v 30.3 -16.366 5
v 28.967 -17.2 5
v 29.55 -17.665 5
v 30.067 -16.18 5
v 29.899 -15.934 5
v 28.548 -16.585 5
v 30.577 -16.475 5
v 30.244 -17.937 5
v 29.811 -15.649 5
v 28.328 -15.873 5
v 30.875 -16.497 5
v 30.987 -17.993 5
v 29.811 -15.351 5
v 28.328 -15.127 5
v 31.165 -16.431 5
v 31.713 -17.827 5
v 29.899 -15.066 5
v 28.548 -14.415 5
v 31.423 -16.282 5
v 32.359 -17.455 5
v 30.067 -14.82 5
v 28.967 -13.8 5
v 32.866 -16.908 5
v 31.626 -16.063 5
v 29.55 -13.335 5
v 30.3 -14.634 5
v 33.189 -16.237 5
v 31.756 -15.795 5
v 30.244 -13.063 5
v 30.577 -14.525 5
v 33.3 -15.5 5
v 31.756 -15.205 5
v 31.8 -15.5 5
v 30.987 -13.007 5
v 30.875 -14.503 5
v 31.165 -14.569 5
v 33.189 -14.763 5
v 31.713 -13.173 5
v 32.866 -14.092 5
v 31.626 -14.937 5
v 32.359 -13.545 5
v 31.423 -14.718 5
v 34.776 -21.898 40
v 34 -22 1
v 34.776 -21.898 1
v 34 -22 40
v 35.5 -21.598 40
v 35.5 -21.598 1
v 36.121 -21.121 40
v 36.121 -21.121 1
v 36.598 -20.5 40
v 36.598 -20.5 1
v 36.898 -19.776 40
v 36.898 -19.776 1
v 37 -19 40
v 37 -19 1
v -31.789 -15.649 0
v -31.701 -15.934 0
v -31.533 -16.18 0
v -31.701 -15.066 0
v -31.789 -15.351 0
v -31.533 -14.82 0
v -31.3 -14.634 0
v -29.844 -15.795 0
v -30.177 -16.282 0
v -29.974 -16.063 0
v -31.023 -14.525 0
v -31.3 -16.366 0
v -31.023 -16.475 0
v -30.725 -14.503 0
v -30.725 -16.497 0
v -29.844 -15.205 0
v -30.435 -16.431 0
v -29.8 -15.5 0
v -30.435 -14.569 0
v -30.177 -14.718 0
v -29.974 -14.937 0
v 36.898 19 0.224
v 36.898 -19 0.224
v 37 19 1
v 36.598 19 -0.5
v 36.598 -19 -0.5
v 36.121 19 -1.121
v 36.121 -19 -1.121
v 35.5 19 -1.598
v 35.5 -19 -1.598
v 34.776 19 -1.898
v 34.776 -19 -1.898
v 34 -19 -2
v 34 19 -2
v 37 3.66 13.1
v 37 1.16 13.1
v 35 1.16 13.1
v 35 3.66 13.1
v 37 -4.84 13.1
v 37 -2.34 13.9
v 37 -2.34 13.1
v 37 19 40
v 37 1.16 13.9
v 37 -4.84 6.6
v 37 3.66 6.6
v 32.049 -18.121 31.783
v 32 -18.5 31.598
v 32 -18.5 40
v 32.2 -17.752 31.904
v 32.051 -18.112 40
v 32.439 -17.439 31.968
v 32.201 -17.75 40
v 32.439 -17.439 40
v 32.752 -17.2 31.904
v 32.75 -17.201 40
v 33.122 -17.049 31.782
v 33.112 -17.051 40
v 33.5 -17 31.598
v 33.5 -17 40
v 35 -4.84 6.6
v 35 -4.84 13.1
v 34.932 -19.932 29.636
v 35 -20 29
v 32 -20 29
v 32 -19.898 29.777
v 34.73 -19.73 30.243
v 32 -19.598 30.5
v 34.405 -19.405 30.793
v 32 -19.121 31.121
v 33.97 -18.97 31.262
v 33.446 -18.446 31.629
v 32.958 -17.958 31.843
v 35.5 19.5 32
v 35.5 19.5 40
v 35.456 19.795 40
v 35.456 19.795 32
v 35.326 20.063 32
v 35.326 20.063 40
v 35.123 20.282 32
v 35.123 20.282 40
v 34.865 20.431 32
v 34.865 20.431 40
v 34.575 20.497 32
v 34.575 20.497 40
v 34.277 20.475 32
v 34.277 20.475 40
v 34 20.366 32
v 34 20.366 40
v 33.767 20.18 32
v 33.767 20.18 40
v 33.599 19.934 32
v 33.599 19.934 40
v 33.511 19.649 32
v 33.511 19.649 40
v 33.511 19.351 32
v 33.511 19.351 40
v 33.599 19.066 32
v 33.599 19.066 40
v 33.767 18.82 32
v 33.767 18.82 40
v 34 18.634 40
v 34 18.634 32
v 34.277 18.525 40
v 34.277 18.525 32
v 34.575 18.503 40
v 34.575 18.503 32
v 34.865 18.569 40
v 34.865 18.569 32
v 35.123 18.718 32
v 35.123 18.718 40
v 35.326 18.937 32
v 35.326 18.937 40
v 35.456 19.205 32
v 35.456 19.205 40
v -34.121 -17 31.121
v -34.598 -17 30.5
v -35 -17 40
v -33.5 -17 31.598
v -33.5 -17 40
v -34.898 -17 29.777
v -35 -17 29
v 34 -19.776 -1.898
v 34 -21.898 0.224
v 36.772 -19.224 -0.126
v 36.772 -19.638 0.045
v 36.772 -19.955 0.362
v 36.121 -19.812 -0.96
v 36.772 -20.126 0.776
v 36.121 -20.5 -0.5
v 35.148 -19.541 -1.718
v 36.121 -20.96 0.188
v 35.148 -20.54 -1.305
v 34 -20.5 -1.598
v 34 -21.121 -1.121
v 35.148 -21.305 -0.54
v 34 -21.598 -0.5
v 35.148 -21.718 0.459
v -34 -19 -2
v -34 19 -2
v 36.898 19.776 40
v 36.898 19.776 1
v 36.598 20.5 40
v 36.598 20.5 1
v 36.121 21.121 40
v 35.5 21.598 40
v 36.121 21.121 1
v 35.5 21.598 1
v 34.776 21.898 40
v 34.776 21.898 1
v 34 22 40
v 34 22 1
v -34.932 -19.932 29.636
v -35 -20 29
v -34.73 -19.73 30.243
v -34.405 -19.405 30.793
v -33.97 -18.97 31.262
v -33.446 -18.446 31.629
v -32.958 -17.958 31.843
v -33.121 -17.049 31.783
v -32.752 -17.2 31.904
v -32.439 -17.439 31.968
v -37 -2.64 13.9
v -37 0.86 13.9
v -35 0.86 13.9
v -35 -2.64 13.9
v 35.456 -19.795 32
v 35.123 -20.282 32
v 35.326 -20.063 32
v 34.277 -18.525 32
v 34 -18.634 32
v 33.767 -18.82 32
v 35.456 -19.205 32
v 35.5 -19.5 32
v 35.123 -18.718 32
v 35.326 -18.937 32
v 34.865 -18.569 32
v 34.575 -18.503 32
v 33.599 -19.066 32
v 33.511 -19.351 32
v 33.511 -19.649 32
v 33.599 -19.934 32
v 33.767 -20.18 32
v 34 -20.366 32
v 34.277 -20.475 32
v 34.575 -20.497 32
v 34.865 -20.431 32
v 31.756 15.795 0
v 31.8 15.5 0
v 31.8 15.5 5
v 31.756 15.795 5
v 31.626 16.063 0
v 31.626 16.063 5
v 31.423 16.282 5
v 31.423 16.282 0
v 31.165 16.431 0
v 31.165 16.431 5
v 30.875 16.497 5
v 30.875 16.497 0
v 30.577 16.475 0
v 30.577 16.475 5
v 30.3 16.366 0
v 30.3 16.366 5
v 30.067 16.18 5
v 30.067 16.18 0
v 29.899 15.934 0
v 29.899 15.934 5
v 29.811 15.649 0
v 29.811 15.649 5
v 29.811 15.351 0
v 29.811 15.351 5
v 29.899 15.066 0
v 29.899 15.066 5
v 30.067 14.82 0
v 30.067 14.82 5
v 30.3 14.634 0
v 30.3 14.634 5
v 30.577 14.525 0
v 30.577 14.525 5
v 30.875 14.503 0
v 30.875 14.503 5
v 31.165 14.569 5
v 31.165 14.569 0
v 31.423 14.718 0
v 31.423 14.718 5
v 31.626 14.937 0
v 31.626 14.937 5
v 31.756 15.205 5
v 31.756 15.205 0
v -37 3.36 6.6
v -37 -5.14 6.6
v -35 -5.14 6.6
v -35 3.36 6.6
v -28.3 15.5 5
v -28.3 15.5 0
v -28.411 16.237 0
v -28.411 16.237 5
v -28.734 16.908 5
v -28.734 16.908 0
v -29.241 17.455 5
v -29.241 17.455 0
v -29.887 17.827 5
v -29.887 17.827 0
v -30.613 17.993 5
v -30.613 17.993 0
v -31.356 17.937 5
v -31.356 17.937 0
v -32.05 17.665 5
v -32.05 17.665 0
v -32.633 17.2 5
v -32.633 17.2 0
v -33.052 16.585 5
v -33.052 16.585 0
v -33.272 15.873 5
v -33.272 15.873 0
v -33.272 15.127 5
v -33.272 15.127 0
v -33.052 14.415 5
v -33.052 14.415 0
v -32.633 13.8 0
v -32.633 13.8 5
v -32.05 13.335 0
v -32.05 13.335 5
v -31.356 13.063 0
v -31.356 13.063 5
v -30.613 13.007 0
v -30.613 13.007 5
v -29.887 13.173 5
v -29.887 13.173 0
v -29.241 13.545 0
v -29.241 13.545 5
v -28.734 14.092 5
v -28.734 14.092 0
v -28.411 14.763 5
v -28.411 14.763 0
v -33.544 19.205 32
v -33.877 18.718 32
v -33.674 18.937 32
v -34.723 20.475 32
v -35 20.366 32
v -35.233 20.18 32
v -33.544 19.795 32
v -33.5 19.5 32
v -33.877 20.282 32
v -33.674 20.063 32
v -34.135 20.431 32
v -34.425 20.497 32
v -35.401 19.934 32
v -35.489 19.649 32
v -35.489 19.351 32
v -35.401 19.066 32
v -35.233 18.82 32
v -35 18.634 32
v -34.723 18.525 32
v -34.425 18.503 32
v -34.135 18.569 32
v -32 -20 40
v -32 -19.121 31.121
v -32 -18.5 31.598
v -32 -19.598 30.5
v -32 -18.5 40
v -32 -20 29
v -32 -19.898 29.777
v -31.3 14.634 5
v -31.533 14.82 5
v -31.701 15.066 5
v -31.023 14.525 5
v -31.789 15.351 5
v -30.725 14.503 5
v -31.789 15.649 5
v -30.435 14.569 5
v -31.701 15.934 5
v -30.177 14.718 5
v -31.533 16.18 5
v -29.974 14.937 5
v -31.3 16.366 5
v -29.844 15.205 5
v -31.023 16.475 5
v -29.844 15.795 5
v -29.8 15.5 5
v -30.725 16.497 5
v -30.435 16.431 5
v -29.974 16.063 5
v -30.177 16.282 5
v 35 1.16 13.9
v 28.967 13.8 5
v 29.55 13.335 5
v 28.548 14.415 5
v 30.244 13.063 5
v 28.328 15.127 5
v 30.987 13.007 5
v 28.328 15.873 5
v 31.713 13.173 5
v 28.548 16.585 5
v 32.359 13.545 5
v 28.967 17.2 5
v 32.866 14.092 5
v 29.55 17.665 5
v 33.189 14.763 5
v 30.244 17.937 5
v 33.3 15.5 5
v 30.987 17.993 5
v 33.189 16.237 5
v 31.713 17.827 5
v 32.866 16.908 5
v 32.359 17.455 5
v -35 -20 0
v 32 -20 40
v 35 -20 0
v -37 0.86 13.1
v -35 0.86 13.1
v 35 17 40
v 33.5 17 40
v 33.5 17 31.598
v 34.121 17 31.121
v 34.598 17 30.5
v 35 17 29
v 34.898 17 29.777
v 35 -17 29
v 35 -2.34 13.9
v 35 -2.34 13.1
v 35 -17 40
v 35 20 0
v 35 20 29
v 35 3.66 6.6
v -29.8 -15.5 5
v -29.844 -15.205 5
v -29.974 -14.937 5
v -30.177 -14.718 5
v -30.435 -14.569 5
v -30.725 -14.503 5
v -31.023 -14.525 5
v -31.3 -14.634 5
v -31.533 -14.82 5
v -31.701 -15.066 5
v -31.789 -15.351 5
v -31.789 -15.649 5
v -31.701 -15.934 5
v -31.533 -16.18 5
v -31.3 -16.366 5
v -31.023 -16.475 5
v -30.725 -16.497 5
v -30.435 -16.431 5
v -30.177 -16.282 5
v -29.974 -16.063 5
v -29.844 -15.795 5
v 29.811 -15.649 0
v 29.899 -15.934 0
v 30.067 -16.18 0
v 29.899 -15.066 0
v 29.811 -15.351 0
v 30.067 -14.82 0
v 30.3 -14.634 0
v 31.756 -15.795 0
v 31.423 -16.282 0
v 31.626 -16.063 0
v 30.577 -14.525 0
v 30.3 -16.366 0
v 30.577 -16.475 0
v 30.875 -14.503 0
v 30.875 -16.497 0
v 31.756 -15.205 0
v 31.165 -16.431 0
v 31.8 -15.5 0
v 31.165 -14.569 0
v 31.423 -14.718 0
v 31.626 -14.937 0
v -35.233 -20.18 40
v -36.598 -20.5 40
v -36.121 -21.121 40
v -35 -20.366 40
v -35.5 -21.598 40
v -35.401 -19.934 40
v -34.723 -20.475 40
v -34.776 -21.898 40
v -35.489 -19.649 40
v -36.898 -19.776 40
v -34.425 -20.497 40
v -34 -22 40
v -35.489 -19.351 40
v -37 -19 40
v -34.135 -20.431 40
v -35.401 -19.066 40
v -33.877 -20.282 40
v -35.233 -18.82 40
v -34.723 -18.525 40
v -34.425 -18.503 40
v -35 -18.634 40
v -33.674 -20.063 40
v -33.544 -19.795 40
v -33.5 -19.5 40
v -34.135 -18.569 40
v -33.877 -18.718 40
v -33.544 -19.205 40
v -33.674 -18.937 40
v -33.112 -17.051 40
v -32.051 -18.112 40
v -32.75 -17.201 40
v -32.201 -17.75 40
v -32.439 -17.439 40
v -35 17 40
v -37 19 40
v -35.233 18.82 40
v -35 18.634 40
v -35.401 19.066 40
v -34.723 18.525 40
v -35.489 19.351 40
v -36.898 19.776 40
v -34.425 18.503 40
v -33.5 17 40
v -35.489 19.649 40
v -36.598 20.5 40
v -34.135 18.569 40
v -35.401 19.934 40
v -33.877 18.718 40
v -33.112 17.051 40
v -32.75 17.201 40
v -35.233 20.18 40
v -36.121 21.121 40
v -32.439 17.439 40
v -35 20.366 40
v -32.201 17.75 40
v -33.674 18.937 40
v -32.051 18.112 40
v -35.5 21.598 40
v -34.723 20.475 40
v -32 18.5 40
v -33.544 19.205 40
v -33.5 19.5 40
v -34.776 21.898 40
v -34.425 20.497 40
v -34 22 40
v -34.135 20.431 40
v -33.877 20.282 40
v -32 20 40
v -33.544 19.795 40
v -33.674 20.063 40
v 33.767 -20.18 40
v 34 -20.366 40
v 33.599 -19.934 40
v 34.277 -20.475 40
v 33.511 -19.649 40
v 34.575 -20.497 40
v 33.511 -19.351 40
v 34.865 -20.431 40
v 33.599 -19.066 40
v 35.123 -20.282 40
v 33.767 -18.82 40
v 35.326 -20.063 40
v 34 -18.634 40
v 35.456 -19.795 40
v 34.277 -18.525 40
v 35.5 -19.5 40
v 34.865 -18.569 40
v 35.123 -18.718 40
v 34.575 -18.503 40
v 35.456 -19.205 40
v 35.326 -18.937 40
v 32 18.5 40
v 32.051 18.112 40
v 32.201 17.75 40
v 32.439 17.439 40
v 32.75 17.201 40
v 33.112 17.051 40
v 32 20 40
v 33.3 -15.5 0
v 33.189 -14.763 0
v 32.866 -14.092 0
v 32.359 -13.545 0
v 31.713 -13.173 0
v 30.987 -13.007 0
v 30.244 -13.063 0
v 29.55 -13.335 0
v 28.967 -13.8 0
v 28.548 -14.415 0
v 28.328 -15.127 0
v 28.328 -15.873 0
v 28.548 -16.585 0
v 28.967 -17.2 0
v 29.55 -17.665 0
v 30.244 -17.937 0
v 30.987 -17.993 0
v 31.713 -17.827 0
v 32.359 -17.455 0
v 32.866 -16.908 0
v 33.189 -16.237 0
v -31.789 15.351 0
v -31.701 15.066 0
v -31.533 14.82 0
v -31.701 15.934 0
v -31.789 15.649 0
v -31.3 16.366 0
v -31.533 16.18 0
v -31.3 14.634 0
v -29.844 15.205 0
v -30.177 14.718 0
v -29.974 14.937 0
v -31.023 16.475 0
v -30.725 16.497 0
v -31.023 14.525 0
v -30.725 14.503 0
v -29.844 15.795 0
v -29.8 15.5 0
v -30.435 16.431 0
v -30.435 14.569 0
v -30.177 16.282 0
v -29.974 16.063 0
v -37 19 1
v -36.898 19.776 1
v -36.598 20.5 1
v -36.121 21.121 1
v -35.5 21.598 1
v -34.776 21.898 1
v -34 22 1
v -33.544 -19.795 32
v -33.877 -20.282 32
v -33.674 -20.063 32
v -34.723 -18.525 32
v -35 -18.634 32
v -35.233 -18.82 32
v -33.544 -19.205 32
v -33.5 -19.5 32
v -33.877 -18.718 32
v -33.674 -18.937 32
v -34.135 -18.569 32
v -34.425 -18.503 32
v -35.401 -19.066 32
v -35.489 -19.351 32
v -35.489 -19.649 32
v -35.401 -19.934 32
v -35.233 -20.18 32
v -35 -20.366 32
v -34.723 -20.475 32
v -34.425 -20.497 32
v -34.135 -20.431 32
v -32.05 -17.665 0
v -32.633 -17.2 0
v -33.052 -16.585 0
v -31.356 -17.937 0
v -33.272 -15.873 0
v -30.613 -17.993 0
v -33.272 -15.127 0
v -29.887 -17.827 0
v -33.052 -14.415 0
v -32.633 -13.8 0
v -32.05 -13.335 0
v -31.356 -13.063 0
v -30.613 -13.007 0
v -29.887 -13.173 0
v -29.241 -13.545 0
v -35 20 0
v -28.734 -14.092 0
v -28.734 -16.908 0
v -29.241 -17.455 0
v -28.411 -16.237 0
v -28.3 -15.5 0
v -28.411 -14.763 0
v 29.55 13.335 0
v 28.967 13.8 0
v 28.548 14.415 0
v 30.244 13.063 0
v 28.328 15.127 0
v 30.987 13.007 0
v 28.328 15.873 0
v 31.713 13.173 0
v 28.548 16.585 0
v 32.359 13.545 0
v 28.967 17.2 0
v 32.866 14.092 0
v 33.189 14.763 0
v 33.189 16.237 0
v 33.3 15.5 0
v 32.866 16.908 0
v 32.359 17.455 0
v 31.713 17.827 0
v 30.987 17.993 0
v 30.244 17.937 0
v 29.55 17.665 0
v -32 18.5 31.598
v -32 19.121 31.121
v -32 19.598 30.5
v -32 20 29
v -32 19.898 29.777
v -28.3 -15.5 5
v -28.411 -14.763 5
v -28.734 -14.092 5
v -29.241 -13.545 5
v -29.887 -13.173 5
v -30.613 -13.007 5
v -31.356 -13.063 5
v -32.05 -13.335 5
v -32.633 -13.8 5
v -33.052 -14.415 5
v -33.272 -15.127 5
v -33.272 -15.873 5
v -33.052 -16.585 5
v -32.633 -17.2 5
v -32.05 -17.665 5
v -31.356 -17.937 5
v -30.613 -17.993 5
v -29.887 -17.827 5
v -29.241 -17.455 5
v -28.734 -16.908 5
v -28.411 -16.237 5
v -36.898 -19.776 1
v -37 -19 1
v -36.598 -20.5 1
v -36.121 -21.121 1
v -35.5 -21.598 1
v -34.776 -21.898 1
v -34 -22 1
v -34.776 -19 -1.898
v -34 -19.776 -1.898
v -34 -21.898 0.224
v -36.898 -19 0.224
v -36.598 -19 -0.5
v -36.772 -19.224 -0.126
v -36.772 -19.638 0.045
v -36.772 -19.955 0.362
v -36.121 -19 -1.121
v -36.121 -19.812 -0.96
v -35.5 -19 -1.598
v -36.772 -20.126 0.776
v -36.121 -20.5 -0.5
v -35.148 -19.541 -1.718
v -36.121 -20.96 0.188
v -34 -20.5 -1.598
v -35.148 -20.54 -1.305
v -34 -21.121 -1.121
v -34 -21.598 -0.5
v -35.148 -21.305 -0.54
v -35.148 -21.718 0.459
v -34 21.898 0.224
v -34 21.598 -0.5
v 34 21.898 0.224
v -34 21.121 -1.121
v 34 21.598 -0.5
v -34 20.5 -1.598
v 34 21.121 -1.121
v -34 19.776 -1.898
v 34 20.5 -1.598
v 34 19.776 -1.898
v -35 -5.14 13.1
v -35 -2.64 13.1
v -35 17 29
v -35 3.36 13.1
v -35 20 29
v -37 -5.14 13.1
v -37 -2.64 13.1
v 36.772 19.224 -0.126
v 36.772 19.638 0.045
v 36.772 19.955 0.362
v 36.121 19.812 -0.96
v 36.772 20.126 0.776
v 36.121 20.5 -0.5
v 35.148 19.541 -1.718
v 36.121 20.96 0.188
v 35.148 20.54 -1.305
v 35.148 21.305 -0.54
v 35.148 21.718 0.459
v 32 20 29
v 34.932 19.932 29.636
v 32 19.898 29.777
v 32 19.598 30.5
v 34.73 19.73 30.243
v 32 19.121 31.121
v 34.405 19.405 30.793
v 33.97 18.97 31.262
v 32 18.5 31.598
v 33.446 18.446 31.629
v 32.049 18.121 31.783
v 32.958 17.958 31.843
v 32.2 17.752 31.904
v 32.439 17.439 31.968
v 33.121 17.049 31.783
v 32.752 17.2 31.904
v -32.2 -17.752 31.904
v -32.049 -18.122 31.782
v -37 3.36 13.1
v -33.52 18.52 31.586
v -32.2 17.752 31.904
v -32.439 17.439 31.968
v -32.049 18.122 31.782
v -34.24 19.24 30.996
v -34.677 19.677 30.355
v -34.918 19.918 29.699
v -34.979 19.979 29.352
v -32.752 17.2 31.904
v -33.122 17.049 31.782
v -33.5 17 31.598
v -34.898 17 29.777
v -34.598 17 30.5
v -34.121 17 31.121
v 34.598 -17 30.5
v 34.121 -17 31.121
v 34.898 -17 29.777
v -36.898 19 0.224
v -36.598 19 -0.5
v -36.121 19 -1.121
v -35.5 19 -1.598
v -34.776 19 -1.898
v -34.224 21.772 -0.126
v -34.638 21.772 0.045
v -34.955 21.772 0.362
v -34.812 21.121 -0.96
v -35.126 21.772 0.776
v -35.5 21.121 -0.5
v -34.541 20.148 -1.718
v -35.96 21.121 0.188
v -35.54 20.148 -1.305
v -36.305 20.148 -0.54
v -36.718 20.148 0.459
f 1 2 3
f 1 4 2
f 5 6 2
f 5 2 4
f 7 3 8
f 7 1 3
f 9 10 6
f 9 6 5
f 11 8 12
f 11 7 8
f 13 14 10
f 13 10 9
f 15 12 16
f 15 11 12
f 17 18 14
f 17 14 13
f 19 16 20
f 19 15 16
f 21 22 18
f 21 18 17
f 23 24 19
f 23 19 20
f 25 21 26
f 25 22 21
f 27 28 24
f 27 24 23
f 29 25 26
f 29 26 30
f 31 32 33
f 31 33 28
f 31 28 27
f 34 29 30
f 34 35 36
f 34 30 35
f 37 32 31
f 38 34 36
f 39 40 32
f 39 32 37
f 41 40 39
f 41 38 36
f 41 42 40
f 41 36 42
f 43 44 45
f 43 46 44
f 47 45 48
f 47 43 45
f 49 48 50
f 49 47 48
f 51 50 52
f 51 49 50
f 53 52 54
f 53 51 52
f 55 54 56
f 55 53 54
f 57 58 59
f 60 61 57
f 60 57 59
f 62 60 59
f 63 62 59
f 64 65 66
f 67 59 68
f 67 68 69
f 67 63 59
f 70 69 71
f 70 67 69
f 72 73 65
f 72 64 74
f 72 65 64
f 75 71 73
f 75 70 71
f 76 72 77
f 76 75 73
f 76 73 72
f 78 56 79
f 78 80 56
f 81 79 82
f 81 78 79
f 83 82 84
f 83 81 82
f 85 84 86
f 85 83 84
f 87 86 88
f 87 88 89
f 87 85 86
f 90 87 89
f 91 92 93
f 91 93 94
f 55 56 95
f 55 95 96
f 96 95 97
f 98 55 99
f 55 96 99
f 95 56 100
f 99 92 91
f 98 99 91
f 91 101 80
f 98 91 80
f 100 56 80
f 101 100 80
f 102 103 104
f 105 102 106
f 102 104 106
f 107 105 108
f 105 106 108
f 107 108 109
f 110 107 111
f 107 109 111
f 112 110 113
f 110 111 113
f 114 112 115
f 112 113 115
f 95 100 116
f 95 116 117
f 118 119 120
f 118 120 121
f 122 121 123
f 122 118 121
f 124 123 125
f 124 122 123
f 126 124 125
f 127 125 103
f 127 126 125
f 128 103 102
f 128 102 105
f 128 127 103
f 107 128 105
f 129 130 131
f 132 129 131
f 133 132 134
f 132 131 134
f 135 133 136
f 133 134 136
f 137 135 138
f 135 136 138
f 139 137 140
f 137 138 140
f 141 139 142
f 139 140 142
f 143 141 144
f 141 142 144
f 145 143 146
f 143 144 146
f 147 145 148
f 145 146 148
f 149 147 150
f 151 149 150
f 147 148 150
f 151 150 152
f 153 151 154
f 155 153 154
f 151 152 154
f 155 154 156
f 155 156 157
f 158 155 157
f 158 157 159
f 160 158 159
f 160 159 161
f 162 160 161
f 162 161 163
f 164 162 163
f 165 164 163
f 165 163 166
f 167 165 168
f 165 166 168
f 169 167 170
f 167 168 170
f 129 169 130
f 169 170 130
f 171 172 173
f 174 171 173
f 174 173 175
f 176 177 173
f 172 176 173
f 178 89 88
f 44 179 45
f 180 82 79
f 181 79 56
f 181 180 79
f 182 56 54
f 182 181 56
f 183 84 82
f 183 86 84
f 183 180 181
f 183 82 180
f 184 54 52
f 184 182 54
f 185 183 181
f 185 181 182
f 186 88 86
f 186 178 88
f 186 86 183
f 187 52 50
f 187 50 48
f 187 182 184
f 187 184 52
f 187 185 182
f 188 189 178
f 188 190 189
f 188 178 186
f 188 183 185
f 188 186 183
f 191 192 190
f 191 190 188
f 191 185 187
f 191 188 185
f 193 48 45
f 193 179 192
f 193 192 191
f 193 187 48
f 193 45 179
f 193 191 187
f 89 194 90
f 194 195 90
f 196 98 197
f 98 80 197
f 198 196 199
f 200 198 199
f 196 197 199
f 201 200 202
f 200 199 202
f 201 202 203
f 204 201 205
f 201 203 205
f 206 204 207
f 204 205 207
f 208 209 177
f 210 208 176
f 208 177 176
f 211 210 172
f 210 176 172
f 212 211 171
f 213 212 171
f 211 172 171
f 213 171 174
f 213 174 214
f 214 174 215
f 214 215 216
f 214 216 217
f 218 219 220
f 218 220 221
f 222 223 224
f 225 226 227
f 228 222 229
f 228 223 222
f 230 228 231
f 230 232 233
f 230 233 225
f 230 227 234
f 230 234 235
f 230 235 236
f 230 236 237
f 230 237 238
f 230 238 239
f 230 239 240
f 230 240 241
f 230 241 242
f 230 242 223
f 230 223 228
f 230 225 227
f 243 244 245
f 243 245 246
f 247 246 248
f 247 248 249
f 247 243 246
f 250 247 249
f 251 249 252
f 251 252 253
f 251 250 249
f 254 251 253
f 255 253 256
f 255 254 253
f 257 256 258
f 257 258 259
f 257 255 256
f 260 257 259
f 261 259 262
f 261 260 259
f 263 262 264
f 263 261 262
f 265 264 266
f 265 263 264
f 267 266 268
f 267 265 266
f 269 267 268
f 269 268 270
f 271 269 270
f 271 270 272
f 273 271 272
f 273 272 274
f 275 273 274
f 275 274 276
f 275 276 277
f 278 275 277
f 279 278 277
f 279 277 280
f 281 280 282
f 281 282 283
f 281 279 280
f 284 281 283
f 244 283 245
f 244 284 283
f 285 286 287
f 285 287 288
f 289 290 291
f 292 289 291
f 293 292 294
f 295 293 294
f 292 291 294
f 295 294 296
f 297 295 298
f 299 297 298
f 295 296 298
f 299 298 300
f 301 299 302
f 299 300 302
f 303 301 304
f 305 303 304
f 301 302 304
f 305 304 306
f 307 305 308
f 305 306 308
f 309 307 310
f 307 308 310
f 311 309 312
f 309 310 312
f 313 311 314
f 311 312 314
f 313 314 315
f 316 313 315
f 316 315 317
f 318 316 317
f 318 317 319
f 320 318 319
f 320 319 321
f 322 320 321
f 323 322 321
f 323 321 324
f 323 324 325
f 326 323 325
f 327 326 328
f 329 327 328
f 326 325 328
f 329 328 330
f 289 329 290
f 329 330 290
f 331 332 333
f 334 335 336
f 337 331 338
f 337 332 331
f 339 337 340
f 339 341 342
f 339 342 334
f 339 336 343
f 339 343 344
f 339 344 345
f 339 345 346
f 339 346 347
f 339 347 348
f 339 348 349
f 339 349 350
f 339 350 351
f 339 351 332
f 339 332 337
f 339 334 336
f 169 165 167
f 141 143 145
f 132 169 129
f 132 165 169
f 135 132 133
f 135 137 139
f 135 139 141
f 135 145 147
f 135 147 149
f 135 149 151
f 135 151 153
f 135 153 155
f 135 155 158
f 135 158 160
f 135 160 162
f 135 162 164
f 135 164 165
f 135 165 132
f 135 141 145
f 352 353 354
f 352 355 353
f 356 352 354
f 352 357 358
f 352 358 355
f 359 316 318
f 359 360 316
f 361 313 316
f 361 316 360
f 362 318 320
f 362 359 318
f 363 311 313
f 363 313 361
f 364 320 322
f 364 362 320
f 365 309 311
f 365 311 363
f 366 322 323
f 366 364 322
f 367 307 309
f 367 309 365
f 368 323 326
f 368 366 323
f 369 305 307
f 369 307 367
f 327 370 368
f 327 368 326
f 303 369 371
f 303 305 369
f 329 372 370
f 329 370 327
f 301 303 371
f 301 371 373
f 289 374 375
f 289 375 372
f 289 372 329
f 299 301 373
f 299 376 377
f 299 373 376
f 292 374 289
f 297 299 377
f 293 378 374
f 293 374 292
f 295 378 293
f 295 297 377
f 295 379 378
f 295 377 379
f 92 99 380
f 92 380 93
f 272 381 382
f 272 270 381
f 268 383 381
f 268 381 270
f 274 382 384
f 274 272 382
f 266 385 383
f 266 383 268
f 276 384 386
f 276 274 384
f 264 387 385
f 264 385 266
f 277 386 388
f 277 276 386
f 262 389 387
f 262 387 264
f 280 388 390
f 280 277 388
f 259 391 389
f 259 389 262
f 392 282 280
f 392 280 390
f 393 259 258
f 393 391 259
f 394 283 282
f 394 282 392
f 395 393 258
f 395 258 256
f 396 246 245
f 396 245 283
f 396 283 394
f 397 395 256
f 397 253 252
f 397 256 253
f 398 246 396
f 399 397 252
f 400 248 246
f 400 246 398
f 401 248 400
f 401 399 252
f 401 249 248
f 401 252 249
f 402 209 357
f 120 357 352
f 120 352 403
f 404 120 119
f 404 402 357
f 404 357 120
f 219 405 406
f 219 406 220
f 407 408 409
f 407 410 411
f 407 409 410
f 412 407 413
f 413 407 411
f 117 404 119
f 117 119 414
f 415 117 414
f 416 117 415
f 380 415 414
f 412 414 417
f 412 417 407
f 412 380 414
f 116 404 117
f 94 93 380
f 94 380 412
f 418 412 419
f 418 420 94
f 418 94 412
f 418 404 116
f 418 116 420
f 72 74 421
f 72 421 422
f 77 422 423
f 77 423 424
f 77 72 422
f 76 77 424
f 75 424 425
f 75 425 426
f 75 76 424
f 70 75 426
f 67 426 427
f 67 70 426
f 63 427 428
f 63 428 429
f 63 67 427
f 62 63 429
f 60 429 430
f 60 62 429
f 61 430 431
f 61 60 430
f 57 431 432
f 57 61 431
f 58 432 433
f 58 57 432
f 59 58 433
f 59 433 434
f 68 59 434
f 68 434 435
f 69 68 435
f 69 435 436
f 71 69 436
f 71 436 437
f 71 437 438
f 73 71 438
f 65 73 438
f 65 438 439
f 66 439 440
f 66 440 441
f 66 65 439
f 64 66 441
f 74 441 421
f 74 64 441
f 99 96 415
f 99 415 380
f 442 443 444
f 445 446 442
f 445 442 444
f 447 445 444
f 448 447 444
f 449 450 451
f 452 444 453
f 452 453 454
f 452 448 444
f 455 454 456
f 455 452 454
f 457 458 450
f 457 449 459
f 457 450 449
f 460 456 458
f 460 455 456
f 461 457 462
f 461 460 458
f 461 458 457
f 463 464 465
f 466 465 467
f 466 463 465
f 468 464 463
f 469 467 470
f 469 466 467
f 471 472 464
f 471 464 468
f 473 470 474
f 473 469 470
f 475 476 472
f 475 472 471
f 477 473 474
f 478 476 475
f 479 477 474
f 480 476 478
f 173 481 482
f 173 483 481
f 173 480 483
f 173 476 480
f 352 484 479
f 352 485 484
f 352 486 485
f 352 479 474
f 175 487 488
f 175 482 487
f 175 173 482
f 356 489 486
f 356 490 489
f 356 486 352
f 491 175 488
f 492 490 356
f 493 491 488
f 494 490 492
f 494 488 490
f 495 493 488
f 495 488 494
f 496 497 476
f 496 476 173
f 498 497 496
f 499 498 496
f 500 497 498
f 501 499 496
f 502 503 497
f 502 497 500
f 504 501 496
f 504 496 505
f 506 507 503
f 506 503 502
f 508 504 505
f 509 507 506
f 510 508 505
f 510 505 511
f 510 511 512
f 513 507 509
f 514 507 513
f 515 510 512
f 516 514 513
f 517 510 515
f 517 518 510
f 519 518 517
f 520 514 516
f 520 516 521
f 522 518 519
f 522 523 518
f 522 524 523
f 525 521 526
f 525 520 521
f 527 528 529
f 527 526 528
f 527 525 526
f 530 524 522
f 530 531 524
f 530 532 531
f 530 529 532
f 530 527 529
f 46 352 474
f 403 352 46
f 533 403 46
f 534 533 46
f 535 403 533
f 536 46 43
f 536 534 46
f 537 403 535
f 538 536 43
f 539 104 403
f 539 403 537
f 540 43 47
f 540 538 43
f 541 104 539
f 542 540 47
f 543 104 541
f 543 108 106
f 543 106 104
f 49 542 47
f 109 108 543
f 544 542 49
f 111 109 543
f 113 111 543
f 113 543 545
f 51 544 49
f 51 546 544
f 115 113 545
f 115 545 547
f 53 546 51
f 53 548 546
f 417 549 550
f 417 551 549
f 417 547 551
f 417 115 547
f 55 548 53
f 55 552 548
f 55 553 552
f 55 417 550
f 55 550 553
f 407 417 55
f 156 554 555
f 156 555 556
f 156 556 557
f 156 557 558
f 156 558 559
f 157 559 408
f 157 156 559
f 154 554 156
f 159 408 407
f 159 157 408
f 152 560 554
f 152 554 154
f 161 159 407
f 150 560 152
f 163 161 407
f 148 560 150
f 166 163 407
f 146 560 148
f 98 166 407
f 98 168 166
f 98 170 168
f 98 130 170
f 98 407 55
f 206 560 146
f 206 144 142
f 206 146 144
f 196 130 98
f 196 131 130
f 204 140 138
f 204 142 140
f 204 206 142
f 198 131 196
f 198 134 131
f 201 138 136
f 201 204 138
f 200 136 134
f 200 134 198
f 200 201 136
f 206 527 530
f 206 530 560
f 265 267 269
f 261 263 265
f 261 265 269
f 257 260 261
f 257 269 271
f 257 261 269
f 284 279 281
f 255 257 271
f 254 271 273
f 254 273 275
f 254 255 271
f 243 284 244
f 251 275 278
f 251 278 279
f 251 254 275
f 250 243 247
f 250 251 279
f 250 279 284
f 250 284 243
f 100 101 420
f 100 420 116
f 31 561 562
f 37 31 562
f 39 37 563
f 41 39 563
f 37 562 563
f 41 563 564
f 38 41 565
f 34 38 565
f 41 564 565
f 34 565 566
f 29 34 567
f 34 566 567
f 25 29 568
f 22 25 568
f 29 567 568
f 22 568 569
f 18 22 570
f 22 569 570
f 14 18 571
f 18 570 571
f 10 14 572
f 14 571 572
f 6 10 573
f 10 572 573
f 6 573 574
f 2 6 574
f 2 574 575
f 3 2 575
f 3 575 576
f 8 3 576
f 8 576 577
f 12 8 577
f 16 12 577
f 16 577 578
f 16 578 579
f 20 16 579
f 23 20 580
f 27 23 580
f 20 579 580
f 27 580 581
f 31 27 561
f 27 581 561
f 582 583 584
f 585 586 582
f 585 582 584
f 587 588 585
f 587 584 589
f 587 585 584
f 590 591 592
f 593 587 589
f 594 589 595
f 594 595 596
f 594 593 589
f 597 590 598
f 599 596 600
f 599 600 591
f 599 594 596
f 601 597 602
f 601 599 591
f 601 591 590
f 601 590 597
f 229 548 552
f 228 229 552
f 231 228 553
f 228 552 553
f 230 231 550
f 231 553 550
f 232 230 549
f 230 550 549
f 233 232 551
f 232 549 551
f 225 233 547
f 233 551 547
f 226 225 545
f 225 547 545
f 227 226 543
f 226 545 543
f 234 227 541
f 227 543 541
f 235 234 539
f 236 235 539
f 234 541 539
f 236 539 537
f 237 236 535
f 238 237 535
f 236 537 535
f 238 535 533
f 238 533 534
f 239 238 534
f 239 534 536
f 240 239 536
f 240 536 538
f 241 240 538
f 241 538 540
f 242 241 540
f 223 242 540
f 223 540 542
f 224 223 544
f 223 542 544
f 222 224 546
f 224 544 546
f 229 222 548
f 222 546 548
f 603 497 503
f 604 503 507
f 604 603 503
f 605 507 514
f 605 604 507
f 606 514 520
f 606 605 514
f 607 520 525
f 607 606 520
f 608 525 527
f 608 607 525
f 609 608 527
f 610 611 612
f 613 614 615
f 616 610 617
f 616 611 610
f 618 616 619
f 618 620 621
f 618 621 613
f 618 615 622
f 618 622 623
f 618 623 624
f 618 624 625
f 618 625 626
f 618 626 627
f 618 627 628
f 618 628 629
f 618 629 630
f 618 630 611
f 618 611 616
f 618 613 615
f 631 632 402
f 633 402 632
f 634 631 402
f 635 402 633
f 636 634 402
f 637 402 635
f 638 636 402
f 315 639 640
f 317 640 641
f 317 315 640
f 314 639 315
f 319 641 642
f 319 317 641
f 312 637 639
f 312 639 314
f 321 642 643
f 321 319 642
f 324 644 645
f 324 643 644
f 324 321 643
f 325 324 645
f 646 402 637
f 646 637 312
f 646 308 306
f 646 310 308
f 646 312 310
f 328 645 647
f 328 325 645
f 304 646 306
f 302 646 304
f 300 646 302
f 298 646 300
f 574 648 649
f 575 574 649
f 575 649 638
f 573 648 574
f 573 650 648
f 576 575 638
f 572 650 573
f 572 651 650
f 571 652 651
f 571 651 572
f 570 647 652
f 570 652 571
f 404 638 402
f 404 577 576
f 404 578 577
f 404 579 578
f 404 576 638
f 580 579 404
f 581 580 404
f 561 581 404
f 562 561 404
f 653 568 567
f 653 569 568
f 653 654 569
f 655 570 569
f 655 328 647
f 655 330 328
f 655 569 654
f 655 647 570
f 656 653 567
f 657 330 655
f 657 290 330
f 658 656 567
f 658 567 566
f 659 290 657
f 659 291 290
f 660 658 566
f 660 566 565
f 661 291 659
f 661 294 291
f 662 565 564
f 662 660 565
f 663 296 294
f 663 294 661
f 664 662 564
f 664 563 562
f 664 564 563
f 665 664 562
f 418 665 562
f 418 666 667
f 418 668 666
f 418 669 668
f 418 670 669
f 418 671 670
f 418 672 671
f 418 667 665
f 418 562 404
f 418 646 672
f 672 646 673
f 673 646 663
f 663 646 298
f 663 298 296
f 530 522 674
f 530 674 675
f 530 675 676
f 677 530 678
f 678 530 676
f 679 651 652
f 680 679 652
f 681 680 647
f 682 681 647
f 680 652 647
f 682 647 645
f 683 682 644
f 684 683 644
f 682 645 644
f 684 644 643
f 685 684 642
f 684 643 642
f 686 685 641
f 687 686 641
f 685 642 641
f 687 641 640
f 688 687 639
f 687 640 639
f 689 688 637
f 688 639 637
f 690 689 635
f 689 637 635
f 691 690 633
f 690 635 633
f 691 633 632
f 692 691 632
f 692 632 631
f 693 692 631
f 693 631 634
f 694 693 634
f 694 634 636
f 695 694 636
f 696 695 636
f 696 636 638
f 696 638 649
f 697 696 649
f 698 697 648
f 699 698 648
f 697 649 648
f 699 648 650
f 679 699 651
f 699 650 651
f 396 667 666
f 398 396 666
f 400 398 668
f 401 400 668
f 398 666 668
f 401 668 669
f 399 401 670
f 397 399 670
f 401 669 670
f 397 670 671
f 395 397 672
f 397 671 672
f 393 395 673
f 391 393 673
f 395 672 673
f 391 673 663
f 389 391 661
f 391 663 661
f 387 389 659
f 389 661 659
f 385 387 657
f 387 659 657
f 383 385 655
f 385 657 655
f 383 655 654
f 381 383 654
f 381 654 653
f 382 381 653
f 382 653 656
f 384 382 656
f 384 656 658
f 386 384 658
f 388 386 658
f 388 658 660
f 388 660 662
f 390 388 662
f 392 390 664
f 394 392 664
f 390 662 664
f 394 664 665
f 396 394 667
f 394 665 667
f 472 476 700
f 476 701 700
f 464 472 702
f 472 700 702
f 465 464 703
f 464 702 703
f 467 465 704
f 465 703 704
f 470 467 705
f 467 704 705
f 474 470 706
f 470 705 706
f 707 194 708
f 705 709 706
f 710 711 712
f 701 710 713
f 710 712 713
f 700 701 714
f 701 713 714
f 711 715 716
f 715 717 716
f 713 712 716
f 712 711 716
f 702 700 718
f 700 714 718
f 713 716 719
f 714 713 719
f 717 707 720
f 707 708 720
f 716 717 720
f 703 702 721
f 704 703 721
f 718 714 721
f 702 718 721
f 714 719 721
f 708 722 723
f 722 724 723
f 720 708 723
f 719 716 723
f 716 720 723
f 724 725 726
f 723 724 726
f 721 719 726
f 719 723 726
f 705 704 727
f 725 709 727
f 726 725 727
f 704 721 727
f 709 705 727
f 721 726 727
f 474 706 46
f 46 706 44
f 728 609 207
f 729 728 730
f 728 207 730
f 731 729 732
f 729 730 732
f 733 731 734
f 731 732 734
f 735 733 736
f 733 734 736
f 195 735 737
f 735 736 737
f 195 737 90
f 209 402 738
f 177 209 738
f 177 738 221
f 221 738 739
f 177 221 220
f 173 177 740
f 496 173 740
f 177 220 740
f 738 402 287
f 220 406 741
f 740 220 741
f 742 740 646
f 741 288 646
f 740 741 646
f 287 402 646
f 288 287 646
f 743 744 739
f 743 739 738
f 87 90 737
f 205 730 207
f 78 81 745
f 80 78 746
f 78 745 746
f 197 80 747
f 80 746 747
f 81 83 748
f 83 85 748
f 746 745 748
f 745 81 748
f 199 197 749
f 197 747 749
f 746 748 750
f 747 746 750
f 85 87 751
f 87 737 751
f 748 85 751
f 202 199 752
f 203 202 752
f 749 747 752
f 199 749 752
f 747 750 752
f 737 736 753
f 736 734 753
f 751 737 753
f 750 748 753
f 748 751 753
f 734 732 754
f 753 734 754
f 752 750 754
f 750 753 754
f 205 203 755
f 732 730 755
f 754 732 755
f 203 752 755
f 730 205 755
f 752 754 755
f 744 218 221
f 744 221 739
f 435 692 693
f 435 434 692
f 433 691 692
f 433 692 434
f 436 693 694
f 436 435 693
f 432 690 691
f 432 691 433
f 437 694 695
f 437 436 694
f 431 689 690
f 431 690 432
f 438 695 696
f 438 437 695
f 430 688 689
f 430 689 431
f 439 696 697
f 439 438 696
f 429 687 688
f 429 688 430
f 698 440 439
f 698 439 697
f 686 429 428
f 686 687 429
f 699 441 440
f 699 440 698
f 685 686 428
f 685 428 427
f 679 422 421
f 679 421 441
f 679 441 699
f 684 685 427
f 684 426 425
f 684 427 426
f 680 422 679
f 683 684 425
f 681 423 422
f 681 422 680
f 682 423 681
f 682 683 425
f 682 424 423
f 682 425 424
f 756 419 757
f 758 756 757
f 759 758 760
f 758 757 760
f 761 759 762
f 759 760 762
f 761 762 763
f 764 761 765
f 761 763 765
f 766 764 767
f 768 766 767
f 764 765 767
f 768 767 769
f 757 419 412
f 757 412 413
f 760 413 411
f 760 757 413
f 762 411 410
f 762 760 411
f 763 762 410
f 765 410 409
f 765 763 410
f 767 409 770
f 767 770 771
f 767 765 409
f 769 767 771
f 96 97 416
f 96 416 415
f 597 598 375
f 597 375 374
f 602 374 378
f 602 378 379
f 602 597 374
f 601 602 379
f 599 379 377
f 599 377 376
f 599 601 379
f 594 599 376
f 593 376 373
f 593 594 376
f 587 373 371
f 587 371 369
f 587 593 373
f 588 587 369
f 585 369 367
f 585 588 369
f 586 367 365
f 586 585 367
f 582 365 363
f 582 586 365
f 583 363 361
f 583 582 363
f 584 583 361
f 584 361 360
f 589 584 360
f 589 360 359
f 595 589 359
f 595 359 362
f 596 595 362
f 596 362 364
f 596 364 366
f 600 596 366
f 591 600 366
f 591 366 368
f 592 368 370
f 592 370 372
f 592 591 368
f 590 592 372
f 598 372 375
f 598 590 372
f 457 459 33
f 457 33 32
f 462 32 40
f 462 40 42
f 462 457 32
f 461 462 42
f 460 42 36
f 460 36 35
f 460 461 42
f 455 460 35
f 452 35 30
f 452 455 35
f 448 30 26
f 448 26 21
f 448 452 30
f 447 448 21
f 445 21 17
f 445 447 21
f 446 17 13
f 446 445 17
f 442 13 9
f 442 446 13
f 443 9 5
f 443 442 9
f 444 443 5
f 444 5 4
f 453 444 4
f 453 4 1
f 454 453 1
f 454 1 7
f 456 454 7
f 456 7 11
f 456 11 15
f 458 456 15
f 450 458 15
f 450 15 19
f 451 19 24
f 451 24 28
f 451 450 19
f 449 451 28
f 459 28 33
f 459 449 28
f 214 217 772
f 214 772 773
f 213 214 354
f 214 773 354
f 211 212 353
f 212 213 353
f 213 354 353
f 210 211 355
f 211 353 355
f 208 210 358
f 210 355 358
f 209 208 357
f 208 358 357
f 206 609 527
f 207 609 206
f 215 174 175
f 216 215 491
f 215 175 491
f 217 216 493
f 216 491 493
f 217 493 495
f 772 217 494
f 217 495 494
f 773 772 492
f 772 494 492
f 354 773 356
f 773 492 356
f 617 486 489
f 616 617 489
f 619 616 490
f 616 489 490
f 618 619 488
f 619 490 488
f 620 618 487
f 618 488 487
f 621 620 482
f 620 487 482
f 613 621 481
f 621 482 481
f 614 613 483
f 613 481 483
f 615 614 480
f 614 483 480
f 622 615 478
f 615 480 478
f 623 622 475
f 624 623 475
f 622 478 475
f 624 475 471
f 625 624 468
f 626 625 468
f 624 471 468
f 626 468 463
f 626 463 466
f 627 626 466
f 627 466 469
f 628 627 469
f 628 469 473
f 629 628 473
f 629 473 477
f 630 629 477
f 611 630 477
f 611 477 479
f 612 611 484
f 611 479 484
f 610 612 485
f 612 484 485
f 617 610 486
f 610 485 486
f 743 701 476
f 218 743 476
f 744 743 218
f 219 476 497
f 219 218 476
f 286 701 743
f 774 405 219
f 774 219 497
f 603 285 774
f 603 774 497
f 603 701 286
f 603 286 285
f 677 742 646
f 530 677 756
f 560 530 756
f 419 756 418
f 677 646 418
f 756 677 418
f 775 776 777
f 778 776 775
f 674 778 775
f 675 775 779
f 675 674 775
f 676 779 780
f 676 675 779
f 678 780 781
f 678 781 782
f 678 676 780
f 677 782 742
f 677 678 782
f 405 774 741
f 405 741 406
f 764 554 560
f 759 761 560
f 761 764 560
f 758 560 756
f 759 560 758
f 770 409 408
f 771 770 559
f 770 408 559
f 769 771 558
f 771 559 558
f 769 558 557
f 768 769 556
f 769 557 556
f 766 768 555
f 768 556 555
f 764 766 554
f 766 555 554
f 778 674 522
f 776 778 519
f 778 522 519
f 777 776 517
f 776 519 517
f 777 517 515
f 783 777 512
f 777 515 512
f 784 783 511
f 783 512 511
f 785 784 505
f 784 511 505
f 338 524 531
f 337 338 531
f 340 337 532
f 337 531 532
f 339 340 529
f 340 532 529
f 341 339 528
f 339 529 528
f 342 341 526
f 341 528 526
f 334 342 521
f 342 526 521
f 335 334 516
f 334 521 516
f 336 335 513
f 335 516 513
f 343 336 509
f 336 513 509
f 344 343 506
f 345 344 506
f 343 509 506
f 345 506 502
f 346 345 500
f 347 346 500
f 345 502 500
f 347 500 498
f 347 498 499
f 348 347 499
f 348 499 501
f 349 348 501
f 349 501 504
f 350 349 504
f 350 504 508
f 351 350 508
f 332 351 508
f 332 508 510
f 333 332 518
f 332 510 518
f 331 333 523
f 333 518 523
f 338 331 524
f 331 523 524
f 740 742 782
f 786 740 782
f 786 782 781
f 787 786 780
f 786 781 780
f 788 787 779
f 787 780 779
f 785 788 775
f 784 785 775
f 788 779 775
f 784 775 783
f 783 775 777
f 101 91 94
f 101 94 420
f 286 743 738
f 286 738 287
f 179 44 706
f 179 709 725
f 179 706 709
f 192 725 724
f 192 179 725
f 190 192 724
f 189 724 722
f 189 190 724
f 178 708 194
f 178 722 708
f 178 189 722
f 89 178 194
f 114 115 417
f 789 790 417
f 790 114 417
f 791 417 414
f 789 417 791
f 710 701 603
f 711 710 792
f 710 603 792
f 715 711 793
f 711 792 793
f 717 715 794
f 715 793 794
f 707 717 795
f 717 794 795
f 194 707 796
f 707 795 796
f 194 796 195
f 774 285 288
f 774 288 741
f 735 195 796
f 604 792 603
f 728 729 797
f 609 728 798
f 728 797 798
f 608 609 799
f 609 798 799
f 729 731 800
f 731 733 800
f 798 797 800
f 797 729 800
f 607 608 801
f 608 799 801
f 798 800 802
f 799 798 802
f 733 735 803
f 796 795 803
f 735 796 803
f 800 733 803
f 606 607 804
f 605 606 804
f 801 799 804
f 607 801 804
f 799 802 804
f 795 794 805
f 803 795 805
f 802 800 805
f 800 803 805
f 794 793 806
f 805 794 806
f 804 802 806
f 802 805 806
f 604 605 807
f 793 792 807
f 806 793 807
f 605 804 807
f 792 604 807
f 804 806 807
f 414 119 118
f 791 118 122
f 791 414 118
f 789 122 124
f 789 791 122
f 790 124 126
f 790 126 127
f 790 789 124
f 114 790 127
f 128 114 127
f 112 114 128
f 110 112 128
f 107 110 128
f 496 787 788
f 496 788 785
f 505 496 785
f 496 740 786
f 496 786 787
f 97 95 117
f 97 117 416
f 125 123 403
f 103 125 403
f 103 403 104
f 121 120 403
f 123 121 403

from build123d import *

# Parameters (mm, degrees)
IZIM1_W                     = 70
IZIM1_H                     = 40
Y_KSEKLIK_EKSTR_ZYON1_DEPTH = 40
BO_ALTMA2_T                 = 2
IZIM2_R                     = 2.5
IZIM2_R_2                   = 1
Y_KSEKLIK_EKSTR_ZYON2_DEPTH = 5
RADYUS2_R                   = 3
KES_EKSTR_ZYON1_DEPTH       = 5
KES_EKSTR_ZYON2_DEPTH       = 5
IZIM5_W                     = 3
IZIM5_H                     = 3
Y_KSEKLIK_EKSTR_ZYON3_DEPTH = 8
RADYUS3_R                   = 3
IZIM6_R                     = 1
KES_EKSTR_ZYON3_DEPTH       = 8
RADYUS4_R                   = 1.5


# Some blends are built 0.0001 mm under size
with BuildPart() as part:
    # Çizim1 → Yükseklik-Ekstrüzyon1 (new body)
    with BuildSketch(Plane.XY):
        Rectangle(IZIM1_W, IZIM1_H)
    extrude(amount=Y_KSEKLIK_EKSTR_ZYON1_DEPTH)

    # İç Boşaltma2
    bo_altma2_openings = [part.faces().sort_by_distance(p)[0] for p in [
        (0, 0, 40),
    ]]
    offset(amount=BO_ALTMA2_T, openings=bo_altma2_openings, kind=Kind.INTERSECTION)

    # Çizim2 → Yükseklik-Ekstrüzyon2 (add)
    # profile 1 of 4: a face of its own
    with BuildSketch(Plane.XY):
        with Locations((-30.8, 15.5)):
            Circle(IZIM2_R)
        with Locations((-30.8, 15.5)):
            Circle(IZIM2_R_2, mode=Mode.SUBTRACT)
    # profile 2 of 4: a face of its own
    with BuildSketch(Plane.XY):
        with Locations((-30.8, -15.5)):
            Circle(IZIM2_R)
        with Locations((-30.8, -15.5)):
            Circle(IZIM2_R_2, mode=Mode.SUBTRACT)
    # profile 3 of 4: a face of its own
    with BuildSketch(Plane.XY):
        with Locations((30.8, -15.5)):
            Circle(IZIM2_R)
        with Locations((30.8, -15.5)):
            Circle(IZIM2_R_2, mode=Mode.SUBTRACT)
    # profile 4 of 4: a face of its own
    with BuildSketch(Plane.XY):
        with Locations((30.8, 15.5)):
            Circle(IZIM2_R)
        with Locations((30.8, 15.5)):
            Circle(IZIM2_R_2, mode=Mode.SUBTRACT)
    extrude(amount=Y_KSEKLIK_EKSTR_ZYON2_DEPTH)

    # Radyus2
    radyus2_edges = [part.edges().sort_by_distance(p)[0] for p in [
        (0, -22, -2),
        (-37, 0, -2),
        (0, 22, -2),
        (37, 0, -2),
        (37, -22, 19),
        (-37, -22, 19),
        (-37, 22, 19),
        (37, 22, 19),
    ]]
    fillet(radyus2_edges, radius=RADYUS2_R)

    # Çizim3 → Kes-Ekstrüzyon1 (cut)
    with BuildSketch(Plane.ZY.offset(37)):
        Polygon((6.6, 3.36), (13.1, 3.36), (13.1, 0.86), (13.9, 0.86), (13.9, -2.64), (13.1, -2.64), (13.1, -5.14), (6.6, -5.14), align=None)
    extrude(amount=-KES_EKSTR_ZYON1_DEPTH, mode=Mode.SUBTRACT)

    # Çizim4 → Kes-Ekstrüzyon2 (cut)
    with BuildSketch(Plane(origin=(37, 0, 0), x_dir=(0, 0, -1), z_dir=(1, 0, 0))):
        Polygon((-13.1, -2.34), (-13.9, -2.34), (-13.9, 1.16), (-13.1, 1.16), (-13.1, 3.66), (-6.6, 3.66), (-6.6, -4.84), (-13.1, -4.84), align=None)
    extrude(amount=-KES_EKSTR_ZYON2_DEPTH, mode=Mode.SUBTRACT)

    # Çizim5 → Yükseklik-Ekstrüzyon3 (add)
    with BuildSketch(Plane.XY.offset(40)):
        with Locations((-33.5, 18.5)):
            Rectangle(IZIM5_W, IZIM5_H)
        with Locations((-33.5, -18.5)):
            Rectangle(IZIM5_W, IZIM5_H)
        with Locations((33.5, 18.5)):
            Rectangle(IZIM5_W, IZIM5_H)
        with Locations((33.5, -18.5)):
            Rectangle(IZIM5_W, IZIM5_H)
    extrude(amount=-Y_KSEKLIK_EKSTR_ZYON3_DEPTH)

    # Radyus3
    radyus3_edges = [part.edges().sort_by_distance(p)[0] for p in [
        (33.5, 20, 32),
        (35, 18.5, 32),
        (33.5, -20, 32),
        (35, -18.5, 32),
        (-35, -18.5, 32),
        (-33.5, -20, 32),
        (-33.5, 20, 32),
        (-35, 18.5, 32),
    ]]
    fillet(radyus3_edges, radius=RADYUS3_R - 0.0001)  # a hair under: the kernel refuses the full size

    # Çizim6 → Kes-Ekstrüzyon3 (cut)
    with BuildSketch(Plane.XY.offset(40)):
        with Locations((-34.5, 19.5)):
            Circle(IZIM6_R)
        with Locations((-34.5, -19.5)):
            Circle(IZIM6_R)
        with Locations((34.5, -19.5)):
            Circle(IZIM6_R)
        with Locations((34.5, 19.5)):
            Circle(IZIM6_R)
    extrude(amount=-KES_EKSTR_ZYON3_DEPTH, mode=Mode.SUBTRACT)

    # Radyus4
    # the kernel refuses this fillet: 1.5 mm, written as the material it takes off along each edge
    with BuildSketch(Plane(origin=(-32, -17, 43.75), x_dir=(-1, 0, 0), z_dir=(0, 0, -1)), Plane(origin=(-32, 17, 43.75), x_dir=(0, 1, 0), z_dir=(0, 0, -1))) as radyus4_piece_1:
        with BuildLine():
            CenterArc((RADYUS4_R, -RADYUS4_R), RADYUS4_R, 90, 90)
            Line((0, -RADYUS4_R), (0, 0))
            Line((0, 0), (RADYUS4_R, 0))
        make_face()
    extrude(amount=15.5, mode=Mode.SUBTRACT)
    with BuildSketch(Plane(origin=(32, -17, 43.75), x_dir=(1, 0, 0), z_dir=(0, 0, -1)), Plane(origin=(32, 17, 43.75), x_dir=(0, 1, 0), z_dir=(0, 0, -1))) as radyus4_piece_2:
        with BuildLine():
            CenterArc((RADYUS4_R, RADYUS4_R), RADYUS4_R, 180, 90)
            Line((0, RADYUS4_R), (0, 0))
            Line((0, 0), (RADYUS4_R, 0))
        make_face()
    extrude(amount=15.5, mode=Mode.SUBTRACT)


solid = part.part
